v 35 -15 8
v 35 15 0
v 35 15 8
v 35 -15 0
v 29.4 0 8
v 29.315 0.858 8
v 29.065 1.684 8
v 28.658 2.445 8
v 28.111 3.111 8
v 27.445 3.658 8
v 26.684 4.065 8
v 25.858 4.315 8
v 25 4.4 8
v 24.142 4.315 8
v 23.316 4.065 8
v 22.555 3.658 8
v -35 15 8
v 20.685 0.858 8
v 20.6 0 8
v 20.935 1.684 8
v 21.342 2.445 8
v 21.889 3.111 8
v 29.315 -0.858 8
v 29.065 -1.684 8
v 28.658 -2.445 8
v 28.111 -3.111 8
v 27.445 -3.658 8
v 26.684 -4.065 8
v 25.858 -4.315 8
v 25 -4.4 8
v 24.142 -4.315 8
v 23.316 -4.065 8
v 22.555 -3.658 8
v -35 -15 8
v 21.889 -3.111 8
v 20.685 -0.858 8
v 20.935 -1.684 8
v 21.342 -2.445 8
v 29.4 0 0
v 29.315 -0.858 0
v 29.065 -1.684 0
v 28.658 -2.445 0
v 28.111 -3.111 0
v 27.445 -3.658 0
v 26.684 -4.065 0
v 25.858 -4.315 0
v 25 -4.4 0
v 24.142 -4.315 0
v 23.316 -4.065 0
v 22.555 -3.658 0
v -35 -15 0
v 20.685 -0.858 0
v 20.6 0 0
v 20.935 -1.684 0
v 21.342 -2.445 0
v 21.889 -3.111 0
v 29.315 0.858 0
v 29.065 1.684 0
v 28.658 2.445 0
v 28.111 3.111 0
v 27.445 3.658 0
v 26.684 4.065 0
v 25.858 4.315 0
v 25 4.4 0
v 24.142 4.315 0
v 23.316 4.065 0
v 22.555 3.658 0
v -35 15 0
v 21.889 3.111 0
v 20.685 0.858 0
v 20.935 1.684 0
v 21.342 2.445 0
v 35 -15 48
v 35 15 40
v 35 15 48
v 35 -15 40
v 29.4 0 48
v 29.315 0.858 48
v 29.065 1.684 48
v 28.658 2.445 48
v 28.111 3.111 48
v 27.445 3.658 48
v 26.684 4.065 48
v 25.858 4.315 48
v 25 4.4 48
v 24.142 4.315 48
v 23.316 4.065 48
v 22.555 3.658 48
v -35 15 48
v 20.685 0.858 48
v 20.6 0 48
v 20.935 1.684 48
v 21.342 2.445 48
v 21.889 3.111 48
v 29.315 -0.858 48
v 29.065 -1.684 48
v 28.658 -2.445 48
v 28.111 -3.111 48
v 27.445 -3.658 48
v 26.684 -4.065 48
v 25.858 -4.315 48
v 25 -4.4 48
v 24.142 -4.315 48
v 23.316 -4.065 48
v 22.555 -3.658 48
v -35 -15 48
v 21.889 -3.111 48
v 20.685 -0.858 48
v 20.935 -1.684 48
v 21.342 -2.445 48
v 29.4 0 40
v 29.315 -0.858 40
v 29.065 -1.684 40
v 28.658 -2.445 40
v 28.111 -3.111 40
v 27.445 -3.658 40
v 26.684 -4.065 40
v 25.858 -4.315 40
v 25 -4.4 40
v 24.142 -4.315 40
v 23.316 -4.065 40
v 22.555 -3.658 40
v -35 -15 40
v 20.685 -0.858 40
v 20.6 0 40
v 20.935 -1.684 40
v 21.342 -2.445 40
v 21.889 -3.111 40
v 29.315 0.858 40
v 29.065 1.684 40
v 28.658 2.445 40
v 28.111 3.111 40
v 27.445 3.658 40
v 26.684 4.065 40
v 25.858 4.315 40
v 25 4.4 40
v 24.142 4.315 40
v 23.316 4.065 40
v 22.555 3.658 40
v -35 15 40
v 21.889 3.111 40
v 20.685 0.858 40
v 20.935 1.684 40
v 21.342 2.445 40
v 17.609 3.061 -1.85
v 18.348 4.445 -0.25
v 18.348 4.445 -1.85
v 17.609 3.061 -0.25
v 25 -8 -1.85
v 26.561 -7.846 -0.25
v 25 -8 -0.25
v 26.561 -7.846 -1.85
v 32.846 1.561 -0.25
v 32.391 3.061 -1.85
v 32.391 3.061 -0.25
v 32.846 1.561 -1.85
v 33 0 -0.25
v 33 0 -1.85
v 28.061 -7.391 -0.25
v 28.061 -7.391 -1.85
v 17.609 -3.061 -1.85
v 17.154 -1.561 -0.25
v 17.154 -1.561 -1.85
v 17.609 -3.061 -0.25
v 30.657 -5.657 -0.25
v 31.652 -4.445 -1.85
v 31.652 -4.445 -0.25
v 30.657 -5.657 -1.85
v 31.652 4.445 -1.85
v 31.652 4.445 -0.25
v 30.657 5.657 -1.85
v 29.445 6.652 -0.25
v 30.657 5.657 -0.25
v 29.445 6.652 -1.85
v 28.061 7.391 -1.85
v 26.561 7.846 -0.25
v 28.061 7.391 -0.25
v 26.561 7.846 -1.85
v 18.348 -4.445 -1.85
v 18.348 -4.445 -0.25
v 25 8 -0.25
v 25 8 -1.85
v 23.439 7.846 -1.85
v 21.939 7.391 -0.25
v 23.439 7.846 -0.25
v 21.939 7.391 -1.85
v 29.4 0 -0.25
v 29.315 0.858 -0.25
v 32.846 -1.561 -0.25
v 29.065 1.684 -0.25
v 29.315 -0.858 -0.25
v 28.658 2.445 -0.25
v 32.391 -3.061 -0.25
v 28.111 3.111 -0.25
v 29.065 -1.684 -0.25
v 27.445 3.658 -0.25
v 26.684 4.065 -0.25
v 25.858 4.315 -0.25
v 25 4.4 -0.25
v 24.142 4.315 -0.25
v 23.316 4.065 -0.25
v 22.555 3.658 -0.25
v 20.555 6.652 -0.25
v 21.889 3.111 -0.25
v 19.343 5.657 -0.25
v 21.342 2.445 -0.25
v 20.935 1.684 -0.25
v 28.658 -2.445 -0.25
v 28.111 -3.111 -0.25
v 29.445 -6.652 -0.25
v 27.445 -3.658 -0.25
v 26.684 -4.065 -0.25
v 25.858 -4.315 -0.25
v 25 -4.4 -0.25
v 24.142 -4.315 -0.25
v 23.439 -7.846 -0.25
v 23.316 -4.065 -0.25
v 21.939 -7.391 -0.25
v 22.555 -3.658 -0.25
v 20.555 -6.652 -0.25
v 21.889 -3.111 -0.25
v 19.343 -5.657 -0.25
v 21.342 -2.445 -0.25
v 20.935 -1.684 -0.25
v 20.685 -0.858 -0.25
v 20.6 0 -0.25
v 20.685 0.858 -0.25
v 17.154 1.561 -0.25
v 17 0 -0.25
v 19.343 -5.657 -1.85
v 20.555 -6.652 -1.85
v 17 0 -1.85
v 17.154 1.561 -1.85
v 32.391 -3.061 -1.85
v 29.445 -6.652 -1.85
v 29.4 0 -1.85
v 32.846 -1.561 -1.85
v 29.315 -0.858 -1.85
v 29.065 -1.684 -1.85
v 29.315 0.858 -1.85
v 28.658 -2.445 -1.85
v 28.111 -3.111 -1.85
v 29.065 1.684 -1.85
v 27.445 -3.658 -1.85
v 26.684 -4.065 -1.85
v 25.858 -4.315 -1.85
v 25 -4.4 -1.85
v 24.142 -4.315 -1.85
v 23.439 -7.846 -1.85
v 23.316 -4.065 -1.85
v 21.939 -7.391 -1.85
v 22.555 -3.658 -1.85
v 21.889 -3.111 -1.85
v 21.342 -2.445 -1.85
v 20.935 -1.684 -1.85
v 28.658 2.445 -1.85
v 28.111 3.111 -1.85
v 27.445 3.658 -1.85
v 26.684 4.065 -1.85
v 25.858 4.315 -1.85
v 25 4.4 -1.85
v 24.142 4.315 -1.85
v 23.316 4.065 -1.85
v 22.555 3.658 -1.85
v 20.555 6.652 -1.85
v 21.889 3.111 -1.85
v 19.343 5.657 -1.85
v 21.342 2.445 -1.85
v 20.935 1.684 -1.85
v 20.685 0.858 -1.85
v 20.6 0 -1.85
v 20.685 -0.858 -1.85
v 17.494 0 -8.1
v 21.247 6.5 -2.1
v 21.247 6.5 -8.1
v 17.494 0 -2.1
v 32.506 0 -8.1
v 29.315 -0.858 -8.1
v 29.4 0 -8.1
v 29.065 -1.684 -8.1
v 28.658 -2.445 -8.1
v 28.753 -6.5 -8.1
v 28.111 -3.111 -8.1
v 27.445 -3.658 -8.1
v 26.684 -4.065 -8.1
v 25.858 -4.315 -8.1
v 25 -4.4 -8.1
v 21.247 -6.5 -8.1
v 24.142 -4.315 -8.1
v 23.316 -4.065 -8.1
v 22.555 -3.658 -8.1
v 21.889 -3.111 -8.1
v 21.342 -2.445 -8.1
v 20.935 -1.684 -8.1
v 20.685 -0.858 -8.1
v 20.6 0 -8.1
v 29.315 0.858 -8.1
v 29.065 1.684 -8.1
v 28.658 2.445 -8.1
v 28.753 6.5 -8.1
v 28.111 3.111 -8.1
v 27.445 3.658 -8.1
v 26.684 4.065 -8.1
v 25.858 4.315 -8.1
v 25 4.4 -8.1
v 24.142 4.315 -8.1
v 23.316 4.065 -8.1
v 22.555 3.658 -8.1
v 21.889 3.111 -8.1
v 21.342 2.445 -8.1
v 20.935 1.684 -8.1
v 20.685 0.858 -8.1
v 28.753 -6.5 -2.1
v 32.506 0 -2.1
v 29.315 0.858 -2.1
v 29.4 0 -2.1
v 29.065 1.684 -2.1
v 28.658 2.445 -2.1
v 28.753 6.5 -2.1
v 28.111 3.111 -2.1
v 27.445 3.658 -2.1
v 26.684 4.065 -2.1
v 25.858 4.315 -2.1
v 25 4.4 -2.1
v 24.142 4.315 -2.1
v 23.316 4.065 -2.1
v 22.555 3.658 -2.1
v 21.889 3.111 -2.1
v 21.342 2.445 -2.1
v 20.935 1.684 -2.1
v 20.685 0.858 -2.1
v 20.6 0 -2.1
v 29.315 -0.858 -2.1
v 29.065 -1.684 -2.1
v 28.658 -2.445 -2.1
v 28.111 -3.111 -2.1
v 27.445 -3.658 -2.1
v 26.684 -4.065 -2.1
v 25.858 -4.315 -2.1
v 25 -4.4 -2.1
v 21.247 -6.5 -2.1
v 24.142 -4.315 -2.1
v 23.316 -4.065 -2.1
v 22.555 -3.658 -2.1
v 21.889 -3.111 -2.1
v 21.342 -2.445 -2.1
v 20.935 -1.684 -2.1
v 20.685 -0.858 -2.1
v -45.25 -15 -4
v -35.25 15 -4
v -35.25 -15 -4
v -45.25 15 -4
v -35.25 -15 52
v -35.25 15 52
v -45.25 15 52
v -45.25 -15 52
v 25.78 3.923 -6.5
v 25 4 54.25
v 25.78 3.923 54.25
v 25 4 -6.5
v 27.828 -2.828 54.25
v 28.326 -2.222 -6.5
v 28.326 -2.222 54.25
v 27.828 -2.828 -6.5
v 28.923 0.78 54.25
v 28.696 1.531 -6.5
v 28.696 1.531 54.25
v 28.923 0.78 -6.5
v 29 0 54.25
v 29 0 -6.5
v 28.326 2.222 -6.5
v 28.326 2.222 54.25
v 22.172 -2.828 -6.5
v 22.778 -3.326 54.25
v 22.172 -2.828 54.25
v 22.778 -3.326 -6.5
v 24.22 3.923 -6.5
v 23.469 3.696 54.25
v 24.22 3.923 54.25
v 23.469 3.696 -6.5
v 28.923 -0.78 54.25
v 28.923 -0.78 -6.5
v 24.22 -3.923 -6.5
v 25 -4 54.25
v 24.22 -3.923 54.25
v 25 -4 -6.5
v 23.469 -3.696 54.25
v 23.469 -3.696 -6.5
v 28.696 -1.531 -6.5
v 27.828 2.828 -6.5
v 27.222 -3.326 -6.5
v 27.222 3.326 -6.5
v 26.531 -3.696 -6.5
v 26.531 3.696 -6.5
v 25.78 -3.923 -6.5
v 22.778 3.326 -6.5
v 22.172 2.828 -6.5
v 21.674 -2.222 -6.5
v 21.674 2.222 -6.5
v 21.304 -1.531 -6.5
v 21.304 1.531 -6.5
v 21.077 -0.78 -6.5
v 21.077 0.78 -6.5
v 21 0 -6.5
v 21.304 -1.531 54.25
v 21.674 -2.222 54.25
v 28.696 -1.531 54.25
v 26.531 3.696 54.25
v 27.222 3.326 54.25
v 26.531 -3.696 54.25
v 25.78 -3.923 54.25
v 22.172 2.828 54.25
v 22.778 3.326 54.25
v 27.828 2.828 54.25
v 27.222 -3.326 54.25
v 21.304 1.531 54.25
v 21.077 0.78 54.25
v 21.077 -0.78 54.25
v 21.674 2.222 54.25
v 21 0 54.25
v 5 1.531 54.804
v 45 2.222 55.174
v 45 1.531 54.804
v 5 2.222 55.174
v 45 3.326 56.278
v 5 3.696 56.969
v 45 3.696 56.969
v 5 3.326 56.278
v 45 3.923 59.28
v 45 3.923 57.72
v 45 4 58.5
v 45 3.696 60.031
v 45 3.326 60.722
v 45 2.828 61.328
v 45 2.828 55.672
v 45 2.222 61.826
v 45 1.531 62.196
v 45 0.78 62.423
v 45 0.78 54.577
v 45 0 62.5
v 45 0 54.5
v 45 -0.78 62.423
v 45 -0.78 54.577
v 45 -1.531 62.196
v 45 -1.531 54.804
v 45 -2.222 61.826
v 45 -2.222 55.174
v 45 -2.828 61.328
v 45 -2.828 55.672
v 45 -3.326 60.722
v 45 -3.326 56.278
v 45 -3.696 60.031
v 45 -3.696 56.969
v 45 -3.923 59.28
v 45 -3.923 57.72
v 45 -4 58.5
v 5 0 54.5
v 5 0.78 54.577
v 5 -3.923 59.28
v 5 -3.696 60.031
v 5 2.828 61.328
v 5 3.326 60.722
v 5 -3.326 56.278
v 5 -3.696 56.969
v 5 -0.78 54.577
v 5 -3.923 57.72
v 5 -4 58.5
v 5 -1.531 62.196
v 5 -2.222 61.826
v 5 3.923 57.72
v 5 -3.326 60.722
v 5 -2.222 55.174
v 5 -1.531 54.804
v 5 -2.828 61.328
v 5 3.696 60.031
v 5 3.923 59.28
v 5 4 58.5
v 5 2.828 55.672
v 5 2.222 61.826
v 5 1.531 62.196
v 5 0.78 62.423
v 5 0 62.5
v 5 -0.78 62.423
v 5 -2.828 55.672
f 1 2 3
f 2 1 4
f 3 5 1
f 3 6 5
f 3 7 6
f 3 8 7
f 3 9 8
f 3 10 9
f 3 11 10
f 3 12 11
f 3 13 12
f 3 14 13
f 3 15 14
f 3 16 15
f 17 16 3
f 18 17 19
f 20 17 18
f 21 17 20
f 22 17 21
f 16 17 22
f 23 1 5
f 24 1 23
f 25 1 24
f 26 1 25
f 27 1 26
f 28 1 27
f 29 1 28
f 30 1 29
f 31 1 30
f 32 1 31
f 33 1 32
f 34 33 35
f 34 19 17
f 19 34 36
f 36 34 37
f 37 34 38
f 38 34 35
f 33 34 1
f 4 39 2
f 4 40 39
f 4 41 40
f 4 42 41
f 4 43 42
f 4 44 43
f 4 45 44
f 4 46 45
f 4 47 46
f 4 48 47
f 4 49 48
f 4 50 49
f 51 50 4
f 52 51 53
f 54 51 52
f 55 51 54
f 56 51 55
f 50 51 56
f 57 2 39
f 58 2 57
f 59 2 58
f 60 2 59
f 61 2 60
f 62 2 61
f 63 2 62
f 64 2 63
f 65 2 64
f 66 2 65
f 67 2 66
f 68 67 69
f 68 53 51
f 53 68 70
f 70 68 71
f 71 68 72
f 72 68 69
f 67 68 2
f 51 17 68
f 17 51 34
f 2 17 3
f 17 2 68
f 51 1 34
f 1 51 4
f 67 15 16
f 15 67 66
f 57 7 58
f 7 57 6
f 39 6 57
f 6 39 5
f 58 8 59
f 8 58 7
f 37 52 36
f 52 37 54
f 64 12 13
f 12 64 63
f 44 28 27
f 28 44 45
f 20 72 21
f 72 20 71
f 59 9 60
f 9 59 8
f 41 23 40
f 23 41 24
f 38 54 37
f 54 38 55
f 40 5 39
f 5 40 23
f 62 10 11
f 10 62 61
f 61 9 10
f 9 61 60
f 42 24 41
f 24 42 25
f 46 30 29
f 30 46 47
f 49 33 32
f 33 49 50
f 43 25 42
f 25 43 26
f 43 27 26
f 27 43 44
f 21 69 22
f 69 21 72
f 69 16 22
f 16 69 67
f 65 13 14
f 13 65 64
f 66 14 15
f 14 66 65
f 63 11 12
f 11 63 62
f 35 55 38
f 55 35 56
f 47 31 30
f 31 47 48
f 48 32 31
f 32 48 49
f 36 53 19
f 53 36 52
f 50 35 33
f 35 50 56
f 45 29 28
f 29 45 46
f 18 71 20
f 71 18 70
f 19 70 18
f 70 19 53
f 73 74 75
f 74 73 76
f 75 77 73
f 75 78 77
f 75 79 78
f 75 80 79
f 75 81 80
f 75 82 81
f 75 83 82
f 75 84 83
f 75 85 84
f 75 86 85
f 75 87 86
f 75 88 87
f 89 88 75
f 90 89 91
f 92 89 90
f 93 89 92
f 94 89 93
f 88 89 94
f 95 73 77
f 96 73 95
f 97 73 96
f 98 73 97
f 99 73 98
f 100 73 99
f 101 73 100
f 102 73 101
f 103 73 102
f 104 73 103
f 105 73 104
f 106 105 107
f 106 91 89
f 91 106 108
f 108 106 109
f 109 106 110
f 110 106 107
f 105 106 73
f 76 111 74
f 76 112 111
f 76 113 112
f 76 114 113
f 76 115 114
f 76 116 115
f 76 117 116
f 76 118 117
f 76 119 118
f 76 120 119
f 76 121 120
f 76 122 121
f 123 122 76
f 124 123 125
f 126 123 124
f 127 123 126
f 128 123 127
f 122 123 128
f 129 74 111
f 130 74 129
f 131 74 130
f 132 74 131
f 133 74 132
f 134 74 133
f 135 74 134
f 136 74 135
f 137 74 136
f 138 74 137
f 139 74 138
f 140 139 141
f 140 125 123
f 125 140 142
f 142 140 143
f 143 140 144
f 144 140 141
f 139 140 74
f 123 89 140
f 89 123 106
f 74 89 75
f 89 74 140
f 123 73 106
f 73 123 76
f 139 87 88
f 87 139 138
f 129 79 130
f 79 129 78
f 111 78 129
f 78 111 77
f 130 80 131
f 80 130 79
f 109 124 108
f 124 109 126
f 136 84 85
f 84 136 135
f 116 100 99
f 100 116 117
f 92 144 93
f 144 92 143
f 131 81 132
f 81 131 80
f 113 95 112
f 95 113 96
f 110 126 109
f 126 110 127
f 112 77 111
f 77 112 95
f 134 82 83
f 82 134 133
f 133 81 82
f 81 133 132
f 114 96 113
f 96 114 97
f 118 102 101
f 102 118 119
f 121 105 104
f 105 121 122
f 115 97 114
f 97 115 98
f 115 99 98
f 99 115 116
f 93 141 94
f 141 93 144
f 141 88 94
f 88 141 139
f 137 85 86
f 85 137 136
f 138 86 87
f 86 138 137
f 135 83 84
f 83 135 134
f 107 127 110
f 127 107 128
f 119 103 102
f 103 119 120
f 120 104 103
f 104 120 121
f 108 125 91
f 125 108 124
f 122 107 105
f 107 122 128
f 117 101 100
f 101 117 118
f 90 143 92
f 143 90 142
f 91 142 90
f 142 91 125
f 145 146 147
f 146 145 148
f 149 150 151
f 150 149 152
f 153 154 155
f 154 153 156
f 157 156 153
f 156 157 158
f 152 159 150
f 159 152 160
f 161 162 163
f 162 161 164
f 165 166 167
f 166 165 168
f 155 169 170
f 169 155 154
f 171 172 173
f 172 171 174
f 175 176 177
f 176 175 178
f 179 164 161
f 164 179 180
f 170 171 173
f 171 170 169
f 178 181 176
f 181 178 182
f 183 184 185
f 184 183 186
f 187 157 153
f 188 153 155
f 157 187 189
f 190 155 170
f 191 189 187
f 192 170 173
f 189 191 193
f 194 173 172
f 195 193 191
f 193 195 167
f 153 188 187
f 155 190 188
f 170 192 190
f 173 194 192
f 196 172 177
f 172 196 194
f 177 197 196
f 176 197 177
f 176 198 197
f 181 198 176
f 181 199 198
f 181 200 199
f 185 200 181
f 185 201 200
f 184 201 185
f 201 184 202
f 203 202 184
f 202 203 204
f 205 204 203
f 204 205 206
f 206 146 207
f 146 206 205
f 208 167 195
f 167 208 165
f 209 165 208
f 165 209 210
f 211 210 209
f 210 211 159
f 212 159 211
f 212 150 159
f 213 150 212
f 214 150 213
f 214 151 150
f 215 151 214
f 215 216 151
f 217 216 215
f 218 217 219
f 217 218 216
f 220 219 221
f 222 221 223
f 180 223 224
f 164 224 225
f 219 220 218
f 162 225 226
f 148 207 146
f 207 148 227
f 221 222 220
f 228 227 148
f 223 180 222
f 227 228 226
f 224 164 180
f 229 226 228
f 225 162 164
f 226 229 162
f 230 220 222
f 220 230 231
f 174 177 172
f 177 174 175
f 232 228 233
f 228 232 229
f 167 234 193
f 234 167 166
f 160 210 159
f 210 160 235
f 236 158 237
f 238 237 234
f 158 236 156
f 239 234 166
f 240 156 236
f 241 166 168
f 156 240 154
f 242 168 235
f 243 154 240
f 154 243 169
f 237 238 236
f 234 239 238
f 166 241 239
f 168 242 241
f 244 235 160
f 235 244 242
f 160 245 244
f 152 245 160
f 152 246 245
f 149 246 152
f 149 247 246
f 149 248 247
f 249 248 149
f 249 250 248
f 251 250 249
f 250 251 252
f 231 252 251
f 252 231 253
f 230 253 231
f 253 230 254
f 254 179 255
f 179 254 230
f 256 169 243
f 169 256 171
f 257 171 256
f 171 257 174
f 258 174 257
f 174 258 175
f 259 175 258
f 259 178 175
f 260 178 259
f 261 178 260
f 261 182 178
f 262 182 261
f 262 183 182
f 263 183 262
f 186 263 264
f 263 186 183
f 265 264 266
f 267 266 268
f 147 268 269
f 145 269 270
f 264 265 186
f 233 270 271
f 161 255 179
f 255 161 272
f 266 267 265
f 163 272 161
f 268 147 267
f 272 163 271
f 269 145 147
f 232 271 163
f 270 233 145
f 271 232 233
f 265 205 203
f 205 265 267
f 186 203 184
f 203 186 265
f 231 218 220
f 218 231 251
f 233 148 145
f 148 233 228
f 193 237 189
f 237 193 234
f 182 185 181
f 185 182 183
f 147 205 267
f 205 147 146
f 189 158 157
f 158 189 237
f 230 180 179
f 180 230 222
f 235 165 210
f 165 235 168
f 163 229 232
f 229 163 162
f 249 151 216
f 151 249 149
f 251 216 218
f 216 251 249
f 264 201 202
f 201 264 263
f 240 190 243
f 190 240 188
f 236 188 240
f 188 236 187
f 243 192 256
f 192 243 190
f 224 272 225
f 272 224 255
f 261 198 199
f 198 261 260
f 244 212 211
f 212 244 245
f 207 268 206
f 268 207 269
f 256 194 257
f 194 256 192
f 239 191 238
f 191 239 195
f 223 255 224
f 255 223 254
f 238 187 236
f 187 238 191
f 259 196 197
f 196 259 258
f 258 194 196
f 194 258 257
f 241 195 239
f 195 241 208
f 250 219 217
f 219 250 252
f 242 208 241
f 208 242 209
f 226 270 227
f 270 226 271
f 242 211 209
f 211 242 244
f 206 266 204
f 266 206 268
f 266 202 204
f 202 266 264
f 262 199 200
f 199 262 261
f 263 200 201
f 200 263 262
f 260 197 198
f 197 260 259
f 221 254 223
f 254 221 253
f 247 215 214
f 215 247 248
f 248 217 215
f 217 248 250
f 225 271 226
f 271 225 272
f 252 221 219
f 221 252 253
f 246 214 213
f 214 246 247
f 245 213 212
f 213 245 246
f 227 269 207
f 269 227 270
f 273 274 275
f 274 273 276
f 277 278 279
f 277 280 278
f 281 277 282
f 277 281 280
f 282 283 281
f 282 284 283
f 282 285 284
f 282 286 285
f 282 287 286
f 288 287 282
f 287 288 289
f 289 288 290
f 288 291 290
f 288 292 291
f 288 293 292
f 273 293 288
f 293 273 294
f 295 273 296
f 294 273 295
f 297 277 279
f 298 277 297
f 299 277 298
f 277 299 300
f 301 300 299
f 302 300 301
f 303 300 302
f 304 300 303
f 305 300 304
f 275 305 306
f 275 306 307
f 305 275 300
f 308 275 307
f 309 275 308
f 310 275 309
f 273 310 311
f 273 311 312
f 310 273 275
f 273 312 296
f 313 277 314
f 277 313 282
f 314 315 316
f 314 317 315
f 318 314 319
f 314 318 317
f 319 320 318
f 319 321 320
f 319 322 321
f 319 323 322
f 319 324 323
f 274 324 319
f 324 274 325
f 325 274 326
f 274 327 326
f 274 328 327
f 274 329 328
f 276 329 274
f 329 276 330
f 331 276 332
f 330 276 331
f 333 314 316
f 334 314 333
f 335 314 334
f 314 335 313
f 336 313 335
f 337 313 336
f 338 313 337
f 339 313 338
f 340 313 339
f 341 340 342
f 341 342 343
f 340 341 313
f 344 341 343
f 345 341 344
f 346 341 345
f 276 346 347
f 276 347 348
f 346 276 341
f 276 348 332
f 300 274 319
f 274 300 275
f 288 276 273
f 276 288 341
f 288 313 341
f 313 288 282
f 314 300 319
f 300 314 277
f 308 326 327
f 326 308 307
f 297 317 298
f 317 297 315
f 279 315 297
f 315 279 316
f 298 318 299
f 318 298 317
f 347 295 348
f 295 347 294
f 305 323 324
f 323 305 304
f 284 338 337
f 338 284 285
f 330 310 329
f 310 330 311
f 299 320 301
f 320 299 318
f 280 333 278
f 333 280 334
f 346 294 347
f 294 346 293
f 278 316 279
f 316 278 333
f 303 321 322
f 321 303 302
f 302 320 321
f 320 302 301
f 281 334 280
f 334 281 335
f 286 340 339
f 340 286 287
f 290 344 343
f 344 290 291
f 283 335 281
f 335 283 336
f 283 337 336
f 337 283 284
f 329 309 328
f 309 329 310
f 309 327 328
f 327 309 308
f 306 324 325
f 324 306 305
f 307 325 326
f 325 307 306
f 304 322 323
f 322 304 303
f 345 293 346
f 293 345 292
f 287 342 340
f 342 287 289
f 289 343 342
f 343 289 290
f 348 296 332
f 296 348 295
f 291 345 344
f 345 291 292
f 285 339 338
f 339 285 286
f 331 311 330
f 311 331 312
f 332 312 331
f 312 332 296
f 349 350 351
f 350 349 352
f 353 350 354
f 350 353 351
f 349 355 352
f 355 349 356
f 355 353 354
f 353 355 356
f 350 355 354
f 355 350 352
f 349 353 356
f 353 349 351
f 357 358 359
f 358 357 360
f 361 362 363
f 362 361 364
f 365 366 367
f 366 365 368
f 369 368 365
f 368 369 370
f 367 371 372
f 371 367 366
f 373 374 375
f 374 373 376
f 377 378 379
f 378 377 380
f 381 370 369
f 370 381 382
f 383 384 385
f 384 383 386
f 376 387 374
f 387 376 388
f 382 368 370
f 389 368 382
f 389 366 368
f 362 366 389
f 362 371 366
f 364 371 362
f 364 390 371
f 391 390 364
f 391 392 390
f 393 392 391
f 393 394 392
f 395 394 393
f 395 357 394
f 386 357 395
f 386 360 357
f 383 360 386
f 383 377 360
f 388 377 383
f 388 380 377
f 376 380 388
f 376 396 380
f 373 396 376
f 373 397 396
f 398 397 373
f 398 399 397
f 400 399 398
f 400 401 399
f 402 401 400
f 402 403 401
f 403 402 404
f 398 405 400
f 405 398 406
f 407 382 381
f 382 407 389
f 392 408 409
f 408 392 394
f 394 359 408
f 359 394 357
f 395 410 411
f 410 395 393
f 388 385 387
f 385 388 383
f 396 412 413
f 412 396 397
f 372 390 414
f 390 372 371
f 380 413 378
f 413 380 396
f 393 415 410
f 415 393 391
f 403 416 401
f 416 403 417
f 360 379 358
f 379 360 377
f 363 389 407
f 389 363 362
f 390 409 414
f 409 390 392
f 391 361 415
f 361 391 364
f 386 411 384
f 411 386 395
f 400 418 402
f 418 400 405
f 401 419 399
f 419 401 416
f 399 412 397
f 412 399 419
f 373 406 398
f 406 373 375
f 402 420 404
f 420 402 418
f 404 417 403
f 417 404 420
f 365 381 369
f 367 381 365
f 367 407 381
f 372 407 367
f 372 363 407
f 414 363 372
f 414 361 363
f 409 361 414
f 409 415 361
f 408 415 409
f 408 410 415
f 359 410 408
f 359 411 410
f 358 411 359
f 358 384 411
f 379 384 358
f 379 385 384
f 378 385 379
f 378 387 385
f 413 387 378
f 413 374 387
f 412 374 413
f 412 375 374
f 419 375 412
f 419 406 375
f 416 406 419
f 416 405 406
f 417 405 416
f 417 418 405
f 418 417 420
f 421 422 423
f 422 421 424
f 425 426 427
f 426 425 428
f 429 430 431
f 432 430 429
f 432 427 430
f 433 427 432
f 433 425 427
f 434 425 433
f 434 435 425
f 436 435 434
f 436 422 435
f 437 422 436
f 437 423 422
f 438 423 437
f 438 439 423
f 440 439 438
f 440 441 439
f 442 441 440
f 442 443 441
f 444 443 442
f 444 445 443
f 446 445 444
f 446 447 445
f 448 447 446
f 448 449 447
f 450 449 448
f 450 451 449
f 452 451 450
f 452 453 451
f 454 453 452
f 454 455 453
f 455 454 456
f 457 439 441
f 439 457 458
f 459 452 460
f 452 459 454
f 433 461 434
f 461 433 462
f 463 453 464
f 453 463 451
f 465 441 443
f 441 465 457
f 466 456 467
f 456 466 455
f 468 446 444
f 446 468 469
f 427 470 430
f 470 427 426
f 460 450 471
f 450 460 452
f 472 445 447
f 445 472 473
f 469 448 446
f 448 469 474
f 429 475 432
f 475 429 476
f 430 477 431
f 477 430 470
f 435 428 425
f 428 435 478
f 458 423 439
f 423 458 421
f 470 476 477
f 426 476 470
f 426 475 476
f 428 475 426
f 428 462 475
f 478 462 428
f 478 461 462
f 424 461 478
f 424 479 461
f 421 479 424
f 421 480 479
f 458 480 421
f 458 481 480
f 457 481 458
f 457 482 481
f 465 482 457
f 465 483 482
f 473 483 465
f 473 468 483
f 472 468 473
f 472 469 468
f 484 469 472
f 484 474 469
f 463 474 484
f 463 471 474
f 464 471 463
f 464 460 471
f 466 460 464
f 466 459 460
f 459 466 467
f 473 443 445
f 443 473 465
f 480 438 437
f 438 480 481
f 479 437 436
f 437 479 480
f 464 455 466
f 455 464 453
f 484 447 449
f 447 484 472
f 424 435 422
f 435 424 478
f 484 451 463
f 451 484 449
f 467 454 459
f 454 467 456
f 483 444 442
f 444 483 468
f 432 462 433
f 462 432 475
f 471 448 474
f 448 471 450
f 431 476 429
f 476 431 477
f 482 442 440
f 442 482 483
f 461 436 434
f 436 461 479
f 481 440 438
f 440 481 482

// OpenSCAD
$fn = 32;

// ------------------------------------------------------------------------
// C clamp: throat 40 mm, screw d8
// Every part is its own module, assembly() places every instance.
// ------------------------------------------------------------------------

// --- part 1 ---
module clamp_arm() {
  difference() {
    translate([-35, -15, 0]) cube([70, 30, 8]);
    translate([25, 0, -1]) cylinder(h = 10, d = 8.8);
  }
}

// --- part 2 ---
module clamp_spine() {
  difference() {
    translate([-28, -15, 0]) cube([56, 30, 10]);
  }
}

// --- part 3 ---
module clamp_screw() {
  translate([0, 0, -30.375]) cylinder(h = 60.75, d = 8);
}

// --- part 4 ---
module clamp_washer() {
  difference() {
      translate([0, 0, 0]) cylinder(h = 1.6, d = 16);
      translate([0, 0, -1]) cylinder(h = 3.6, d = 8.8);
    }
}

// --- part 5 ---
module clamp_nut() {
  difference() {
    linear_extrude(height = 6) polygon(points = [[7.506, 0], [3.753, 6.5], [-3.753, 6.5], [-7.506, 0], [-3.753, -6.5], [3.753, -6.5]]);
    translate([0, 0, -1]) cylinder(h = 8, d = 8.8);
  }
}

// --- part 6 ---
module tommy_bar() {
  translate([0, 0, -20]) cylinder(h = 40, d = 8);
}

// --- assembly ---
module assembly() {
  color([0.80, 0.24, 0.20]) translate([0, 0, 0]) rotate([0, 0, 0]) clamp_arm();
  color([0.20, 0.45, 0.75]) translate([0, 0, 40]) rotate([0, 0, 0]) clamp_arm();
  color([0.25, 0.62, 0.32]) translate([-45.25, 0, 24]) rotate([0, 90, 0]) clamp_spine();
  color([0.92, 0.70, 0.18]) translate([25, 0, 23.875]) rotate([0, 0, 0]) clamp_screw();
  color([0.58, 0.35, 0.70]) translate([25, 0, -1.85]) rotate([0, 0, 0]) clamp_washer();
  color([0.16, 0.66, 0.66]) translate([25, 0, -8.1]) rotate([0, 0, 0]) clamp_nut();
  color([0.85, 0.48, 0.18]) translate([25, 0, 58.5]) rotate([0, 90, 0]) tommy_bar();
}

assembly();
